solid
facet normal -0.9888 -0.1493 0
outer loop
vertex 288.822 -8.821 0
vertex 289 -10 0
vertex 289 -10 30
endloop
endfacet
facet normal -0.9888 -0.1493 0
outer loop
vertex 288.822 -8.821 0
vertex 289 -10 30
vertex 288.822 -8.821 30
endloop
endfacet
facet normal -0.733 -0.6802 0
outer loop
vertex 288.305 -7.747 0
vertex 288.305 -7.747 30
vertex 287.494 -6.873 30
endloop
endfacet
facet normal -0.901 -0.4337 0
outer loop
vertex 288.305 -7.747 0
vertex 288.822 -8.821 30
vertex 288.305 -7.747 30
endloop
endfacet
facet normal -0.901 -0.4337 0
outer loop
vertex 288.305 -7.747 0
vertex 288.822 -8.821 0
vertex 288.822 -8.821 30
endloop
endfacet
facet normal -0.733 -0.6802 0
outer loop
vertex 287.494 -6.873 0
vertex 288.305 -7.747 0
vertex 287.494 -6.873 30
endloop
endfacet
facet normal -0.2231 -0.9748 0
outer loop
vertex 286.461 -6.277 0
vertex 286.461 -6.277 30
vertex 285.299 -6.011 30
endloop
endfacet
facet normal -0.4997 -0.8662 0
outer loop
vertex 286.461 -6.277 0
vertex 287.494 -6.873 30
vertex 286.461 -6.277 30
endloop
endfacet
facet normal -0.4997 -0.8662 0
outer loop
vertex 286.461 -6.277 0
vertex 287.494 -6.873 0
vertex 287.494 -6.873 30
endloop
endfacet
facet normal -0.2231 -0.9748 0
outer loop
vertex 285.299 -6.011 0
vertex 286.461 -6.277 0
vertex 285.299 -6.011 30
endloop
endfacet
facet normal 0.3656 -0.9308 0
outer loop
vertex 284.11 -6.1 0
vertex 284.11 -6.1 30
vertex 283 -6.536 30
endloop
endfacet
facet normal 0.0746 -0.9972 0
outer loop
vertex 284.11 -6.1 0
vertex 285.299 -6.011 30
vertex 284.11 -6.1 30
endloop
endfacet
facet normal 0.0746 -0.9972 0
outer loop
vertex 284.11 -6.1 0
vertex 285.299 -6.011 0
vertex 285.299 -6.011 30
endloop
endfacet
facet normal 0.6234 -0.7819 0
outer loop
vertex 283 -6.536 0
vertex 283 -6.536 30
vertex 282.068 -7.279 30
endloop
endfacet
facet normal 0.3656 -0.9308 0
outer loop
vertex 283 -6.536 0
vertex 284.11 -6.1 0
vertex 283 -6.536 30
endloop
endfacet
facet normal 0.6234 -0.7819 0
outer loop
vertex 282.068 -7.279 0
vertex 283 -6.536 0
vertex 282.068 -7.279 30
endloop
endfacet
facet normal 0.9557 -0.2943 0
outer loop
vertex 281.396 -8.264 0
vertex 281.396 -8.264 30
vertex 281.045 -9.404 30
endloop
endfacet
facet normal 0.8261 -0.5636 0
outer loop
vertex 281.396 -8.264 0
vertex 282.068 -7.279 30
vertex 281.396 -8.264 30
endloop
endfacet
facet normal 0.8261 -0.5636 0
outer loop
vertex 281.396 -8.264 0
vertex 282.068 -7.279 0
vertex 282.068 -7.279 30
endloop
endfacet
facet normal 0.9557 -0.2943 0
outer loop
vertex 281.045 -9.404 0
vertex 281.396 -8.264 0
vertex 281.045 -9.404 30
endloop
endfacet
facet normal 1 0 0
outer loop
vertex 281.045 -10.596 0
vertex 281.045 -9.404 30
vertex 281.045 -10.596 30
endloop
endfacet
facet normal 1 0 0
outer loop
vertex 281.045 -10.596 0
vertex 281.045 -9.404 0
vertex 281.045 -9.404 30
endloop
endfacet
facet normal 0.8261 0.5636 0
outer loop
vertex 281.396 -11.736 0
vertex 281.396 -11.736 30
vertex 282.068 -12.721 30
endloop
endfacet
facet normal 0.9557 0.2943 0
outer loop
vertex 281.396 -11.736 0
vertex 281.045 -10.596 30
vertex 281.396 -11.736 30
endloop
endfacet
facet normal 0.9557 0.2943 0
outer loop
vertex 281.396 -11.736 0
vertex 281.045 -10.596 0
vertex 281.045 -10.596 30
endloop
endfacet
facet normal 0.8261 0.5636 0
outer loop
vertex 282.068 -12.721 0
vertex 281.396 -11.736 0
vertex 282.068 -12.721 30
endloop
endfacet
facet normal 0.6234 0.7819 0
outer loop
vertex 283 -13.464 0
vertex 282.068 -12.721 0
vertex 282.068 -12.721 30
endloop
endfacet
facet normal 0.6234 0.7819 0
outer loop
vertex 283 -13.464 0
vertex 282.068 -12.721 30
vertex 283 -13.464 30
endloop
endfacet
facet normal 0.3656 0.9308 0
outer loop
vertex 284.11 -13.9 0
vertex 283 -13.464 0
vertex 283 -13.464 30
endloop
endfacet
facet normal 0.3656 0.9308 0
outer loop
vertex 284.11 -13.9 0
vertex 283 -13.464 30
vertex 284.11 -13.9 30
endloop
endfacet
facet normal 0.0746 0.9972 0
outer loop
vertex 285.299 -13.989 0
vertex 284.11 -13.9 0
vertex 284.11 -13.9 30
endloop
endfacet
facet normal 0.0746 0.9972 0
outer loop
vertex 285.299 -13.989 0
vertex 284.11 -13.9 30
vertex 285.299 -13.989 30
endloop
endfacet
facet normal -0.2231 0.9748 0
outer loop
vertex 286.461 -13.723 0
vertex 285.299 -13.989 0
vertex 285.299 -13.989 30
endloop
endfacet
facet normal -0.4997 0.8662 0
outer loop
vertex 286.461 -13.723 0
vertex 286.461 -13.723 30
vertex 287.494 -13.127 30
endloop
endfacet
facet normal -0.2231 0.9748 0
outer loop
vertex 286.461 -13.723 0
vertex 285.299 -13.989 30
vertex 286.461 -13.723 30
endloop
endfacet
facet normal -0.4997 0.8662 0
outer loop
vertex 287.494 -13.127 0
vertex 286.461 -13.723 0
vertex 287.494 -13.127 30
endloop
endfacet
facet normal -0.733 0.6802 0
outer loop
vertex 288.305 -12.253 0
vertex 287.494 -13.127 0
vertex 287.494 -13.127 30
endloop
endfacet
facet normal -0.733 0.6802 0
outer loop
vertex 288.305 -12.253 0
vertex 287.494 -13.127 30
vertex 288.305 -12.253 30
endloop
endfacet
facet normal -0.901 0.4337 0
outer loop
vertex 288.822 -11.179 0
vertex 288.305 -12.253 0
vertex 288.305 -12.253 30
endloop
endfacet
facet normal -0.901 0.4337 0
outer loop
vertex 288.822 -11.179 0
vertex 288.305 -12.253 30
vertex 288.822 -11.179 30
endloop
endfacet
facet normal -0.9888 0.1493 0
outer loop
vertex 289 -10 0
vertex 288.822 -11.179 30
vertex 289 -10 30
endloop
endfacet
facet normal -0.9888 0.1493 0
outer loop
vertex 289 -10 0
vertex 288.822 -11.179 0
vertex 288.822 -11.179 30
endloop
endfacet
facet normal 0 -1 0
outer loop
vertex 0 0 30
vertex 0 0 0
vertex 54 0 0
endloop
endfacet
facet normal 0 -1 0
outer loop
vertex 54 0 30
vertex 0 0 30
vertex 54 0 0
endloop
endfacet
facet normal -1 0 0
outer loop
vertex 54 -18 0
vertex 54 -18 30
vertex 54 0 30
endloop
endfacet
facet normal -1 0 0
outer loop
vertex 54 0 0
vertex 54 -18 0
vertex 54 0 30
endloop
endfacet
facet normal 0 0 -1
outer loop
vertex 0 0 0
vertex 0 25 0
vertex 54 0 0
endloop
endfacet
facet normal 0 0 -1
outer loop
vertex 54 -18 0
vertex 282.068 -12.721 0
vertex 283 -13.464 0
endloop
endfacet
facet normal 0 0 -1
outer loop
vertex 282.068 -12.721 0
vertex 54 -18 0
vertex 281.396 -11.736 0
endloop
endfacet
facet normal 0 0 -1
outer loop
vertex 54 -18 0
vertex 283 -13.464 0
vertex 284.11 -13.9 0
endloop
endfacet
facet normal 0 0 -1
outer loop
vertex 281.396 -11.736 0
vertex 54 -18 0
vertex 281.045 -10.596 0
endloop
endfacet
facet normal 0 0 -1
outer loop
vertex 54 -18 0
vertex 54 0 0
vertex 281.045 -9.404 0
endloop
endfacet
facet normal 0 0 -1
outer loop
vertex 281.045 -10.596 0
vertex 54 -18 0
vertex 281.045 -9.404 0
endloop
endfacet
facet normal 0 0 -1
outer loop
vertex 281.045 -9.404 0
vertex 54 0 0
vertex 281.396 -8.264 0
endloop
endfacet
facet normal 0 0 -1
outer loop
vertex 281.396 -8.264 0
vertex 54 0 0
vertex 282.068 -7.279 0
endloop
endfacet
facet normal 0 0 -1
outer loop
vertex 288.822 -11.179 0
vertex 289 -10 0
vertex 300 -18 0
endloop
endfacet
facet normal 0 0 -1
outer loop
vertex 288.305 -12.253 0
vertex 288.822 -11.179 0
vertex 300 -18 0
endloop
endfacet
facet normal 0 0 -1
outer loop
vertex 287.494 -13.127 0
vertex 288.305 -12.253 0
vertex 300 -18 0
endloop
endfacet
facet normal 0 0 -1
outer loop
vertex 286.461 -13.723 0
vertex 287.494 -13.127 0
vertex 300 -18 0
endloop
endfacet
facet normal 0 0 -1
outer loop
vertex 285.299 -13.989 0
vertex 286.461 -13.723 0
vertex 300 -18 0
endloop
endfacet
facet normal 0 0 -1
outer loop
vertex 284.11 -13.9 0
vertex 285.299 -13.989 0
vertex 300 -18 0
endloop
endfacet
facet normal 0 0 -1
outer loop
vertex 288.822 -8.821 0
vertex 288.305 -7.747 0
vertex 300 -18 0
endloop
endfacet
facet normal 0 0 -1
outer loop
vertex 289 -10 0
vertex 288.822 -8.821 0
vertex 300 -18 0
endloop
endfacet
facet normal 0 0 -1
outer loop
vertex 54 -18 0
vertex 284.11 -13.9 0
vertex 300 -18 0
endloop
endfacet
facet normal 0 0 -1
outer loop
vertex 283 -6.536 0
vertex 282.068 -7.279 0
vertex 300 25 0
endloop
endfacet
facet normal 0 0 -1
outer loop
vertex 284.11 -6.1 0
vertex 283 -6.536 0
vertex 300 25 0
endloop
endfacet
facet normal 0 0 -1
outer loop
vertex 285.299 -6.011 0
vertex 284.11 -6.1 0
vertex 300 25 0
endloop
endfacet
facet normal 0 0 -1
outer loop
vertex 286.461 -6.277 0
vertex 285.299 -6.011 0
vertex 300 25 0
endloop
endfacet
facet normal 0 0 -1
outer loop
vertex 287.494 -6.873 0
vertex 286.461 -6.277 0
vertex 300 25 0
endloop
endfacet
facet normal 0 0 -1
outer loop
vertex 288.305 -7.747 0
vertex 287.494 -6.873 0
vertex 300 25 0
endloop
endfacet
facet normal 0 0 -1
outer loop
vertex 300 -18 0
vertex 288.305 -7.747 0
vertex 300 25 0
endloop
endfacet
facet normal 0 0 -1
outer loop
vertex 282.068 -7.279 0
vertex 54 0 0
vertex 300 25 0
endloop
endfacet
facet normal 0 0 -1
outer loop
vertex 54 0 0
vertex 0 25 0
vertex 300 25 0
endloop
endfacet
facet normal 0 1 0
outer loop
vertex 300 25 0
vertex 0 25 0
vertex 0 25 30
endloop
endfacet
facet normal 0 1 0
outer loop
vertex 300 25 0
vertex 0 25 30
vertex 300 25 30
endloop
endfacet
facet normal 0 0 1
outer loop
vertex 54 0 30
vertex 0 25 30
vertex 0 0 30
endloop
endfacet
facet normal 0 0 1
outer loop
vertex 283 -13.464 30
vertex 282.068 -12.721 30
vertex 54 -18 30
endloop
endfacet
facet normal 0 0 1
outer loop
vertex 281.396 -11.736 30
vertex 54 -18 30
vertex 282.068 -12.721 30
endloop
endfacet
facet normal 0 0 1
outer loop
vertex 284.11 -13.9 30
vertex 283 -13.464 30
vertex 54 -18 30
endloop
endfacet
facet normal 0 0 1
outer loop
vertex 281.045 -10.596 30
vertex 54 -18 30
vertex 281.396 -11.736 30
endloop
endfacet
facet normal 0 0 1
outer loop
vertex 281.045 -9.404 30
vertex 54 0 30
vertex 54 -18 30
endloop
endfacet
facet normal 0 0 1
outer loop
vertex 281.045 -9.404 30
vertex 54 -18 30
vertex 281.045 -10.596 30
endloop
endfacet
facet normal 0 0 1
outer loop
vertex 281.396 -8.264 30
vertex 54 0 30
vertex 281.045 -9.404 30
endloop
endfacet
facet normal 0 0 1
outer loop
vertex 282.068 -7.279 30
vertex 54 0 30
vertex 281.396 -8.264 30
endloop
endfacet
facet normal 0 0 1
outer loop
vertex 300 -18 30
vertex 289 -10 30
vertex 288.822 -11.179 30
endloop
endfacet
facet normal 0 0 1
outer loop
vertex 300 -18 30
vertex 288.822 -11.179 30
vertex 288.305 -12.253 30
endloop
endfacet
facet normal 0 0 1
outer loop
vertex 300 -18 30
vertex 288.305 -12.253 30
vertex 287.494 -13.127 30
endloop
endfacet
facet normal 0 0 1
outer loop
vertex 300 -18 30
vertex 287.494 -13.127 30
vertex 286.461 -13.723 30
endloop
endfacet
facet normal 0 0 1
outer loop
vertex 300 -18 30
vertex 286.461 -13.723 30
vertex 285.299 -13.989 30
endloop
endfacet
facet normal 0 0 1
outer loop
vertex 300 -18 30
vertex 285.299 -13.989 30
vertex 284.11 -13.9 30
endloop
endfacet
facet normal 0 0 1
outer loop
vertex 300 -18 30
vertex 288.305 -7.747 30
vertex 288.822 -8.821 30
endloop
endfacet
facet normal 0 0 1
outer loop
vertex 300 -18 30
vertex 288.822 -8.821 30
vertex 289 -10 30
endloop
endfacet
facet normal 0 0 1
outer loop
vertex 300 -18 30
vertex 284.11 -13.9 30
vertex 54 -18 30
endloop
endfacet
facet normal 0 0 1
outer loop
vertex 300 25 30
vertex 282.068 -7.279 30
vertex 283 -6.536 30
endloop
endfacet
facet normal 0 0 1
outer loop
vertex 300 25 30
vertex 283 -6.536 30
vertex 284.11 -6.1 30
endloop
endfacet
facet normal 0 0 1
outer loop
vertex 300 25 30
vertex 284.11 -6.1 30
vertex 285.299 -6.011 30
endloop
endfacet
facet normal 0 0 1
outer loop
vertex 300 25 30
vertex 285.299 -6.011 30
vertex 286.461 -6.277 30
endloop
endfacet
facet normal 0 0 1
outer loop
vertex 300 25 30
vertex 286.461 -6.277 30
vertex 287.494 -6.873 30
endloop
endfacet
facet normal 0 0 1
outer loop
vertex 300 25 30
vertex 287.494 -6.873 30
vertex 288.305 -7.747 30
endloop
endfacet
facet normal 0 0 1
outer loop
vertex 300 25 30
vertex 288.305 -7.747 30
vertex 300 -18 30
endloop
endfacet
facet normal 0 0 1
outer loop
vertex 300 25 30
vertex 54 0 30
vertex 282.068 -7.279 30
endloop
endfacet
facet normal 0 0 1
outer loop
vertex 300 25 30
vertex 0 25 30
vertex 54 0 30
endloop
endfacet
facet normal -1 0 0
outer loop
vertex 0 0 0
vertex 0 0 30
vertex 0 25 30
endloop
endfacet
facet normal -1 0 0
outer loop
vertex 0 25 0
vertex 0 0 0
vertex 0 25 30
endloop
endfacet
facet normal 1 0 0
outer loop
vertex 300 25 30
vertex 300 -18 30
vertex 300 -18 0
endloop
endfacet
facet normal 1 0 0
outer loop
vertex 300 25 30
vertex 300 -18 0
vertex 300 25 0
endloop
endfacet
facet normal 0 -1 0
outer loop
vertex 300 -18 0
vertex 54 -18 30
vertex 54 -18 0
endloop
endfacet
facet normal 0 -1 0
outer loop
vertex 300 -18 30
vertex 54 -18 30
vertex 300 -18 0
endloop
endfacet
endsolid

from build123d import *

# Parameters (mm, degrees)
ESQUISSE1_W                  = 300
ESQUISSE1_H                  = 25
BOSS_EXTRU_1_DEPTH           = 30
ESQUISSE3_W                  = 246
ESQUISSE3_H                  = 18
BOSS_EXTRU_2_DEPTH           = 30
ENL_V_MAT_EXTRU_1_DEPTH      = 303.530990148
ENL_V_MAT_EXTRU_1_DEPTH_BACK = 303.530990148
ESQUISSE2_R                  = 4


with BuildPart() as part:
    # Esquisse1 → Boss.-Extru.1 (new body)
    with BuildSketch(Plane.XY):
        with Locations((150, 12.5)):
            Rectangle(ESQUISSE1_W, ESQUISSE1_H)
    extrude(amount=BOSS_EXTRU_1_DEPTH)

    # Esquisse3 → Boss.-Extru.2 (add)
    with BuildSketch(Plane.XY.offset(30)):
        with Locations((177, -9)):
            Rectangle(ESQUISSE3_W, ESQUISSE3_H)
    extrude(amount=-BOSS_EXTRU_2_DEPTH)

    # Esquisse2 → Enlèv. mat.-Extru.1 (cut, two sides: drawn at the far end of the back side and taken through both)
    with BuildSketch(Plane.XY.offset(30).offset(-ENL_V_MAT_EXTRU_1_DEPTH_BACK)):
        with Locations((285, -10)):
            Circle(ESQUISSE2_R)
    extrude(amount=ENL_V_MAT_EXTRU_1_DEPTH + ENL_V_MAT_EXTRU_1_DEPTH_BACK, mode=Mode.SUBTRACT)


solid = part.part
